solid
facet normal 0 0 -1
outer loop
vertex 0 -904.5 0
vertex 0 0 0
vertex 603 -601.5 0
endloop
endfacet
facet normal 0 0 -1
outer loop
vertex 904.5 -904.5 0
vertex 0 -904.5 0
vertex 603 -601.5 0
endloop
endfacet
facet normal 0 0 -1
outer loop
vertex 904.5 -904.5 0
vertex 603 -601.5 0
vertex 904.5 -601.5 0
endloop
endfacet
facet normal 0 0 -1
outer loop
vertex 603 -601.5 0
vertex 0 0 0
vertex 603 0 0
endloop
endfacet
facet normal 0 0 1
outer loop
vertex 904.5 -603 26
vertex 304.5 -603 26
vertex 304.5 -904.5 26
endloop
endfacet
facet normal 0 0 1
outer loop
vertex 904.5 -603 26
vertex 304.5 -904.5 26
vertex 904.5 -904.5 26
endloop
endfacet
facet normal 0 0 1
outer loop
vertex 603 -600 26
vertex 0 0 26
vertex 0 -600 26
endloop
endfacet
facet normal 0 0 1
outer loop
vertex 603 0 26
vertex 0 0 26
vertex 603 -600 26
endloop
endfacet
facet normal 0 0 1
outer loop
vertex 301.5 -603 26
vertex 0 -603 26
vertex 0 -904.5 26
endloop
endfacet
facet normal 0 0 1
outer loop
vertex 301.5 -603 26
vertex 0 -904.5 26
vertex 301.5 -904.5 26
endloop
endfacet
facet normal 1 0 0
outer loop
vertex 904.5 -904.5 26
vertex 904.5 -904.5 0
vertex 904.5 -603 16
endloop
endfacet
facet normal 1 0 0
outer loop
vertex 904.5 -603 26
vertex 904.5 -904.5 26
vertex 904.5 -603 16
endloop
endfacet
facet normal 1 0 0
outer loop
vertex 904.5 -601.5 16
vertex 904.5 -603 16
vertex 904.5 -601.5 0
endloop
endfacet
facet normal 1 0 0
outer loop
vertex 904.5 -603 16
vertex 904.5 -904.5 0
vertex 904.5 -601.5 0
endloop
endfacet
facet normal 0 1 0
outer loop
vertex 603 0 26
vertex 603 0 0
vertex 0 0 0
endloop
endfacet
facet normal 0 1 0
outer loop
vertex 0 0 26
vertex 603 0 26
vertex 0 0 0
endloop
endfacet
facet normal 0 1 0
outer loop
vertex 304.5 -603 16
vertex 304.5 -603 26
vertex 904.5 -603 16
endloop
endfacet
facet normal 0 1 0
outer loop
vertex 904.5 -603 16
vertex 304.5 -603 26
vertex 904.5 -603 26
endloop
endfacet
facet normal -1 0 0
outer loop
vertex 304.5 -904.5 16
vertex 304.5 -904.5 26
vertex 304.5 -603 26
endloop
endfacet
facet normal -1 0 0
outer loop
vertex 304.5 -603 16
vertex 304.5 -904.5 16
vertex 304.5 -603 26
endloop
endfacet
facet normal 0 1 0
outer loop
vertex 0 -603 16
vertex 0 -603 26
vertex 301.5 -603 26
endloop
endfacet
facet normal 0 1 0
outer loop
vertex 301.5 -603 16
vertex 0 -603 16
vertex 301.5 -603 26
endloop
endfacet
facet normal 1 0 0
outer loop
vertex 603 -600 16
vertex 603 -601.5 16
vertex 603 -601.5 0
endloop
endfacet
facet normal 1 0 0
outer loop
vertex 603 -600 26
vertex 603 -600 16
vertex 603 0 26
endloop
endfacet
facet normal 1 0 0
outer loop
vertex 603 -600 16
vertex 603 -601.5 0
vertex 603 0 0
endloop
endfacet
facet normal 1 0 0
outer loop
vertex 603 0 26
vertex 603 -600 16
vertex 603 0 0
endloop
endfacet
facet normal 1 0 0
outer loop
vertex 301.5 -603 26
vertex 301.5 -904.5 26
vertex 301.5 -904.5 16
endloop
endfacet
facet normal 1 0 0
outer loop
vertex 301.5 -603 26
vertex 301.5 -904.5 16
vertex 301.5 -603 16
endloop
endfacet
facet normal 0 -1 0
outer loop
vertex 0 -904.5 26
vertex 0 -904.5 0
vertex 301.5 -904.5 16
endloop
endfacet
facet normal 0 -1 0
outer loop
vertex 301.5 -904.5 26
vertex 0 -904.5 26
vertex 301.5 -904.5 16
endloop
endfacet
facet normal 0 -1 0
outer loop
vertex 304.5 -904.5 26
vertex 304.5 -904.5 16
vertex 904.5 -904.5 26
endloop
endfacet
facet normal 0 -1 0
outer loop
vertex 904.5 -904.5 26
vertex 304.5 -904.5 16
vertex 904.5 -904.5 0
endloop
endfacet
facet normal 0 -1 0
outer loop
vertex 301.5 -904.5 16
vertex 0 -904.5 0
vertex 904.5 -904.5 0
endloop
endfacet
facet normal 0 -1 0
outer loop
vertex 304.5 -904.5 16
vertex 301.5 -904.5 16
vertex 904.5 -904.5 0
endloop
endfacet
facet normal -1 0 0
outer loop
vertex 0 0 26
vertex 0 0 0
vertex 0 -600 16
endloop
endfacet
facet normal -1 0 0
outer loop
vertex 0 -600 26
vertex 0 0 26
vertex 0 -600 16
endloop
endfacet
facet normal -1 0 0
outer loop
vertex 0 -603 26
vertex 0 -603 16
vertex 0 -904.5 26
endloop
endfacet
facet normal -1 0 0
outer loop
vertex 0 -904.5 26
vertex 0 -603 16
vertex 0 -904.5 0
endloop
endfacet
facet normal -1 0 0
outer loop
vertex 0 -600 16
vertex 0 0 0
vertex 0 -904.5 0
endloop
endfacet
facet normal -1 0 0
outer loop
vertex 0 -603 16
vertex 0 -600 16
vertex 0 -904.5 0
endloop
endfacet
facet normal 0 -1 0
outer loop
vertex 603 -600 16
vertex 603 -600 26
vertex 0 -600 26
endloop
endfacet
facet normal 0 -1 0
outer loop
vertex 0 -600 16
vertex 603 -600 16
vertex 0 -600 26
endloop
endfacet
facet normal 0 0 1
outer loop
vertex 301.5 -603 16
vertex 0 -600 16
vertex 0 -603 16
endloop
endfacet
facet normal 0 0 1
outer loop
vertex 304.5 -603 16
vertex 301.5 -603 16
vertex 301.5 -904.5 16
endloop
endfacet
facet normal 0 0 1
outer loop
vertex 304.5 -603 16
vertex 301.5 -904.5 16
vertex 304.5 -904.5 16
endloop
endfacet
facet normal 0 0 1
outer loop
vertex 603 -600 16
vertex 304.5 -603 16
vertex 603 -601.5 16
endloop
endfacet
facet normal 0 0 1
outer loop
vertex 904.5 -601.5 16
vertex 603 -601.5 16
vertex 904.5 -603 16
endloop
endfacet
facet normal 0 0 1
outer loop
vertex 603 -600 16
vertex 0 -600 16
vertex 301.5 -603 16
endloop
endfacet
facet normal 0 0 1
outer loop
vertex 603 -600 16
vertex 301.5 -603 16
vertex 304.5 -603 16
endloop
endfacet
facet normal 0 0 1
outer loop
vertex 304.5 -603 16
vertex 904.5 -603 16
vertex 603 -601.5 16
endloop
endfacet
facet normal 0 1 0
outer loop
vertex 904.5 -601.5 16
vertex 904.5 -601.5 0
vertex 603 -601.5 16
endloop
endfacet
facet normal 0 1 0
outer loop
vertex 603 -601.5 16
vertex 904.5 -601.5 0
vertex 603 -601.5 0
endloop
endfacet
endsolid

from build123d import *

# Parameters (mm, degrees)
F1_DEPTH = 26
F2_W     = 3
F2_H     = 301.5
F3_DEPTH = 10


with BuildPart() as f1:
    # F0 (on Top) → F1 (new body)
    with BuildSketch(Plane.XY):
        Polygon((603, 0), (0, 0), (0, -904.5), (904.5, -904.5), (904.5, -601.5), (603, -601.5), align=None)
    extrude(amount=F1_DEPTH)

    # F2 (on face) → F3 (cut)
    with BuildSketch(Plane.XY.offset(26)):
        Polygon((0, -600), (0, -603), (301.5, -603), (304.5, -603), (904.5, -603), (904.5, -600), align=None)
        with Locations((303, -753.75)):
            Rectangle(F2_W, F2_H)
    extrude(amount=-F3_DEPTH, mode=Mode.SUBTRACT)


solid = f1.part
